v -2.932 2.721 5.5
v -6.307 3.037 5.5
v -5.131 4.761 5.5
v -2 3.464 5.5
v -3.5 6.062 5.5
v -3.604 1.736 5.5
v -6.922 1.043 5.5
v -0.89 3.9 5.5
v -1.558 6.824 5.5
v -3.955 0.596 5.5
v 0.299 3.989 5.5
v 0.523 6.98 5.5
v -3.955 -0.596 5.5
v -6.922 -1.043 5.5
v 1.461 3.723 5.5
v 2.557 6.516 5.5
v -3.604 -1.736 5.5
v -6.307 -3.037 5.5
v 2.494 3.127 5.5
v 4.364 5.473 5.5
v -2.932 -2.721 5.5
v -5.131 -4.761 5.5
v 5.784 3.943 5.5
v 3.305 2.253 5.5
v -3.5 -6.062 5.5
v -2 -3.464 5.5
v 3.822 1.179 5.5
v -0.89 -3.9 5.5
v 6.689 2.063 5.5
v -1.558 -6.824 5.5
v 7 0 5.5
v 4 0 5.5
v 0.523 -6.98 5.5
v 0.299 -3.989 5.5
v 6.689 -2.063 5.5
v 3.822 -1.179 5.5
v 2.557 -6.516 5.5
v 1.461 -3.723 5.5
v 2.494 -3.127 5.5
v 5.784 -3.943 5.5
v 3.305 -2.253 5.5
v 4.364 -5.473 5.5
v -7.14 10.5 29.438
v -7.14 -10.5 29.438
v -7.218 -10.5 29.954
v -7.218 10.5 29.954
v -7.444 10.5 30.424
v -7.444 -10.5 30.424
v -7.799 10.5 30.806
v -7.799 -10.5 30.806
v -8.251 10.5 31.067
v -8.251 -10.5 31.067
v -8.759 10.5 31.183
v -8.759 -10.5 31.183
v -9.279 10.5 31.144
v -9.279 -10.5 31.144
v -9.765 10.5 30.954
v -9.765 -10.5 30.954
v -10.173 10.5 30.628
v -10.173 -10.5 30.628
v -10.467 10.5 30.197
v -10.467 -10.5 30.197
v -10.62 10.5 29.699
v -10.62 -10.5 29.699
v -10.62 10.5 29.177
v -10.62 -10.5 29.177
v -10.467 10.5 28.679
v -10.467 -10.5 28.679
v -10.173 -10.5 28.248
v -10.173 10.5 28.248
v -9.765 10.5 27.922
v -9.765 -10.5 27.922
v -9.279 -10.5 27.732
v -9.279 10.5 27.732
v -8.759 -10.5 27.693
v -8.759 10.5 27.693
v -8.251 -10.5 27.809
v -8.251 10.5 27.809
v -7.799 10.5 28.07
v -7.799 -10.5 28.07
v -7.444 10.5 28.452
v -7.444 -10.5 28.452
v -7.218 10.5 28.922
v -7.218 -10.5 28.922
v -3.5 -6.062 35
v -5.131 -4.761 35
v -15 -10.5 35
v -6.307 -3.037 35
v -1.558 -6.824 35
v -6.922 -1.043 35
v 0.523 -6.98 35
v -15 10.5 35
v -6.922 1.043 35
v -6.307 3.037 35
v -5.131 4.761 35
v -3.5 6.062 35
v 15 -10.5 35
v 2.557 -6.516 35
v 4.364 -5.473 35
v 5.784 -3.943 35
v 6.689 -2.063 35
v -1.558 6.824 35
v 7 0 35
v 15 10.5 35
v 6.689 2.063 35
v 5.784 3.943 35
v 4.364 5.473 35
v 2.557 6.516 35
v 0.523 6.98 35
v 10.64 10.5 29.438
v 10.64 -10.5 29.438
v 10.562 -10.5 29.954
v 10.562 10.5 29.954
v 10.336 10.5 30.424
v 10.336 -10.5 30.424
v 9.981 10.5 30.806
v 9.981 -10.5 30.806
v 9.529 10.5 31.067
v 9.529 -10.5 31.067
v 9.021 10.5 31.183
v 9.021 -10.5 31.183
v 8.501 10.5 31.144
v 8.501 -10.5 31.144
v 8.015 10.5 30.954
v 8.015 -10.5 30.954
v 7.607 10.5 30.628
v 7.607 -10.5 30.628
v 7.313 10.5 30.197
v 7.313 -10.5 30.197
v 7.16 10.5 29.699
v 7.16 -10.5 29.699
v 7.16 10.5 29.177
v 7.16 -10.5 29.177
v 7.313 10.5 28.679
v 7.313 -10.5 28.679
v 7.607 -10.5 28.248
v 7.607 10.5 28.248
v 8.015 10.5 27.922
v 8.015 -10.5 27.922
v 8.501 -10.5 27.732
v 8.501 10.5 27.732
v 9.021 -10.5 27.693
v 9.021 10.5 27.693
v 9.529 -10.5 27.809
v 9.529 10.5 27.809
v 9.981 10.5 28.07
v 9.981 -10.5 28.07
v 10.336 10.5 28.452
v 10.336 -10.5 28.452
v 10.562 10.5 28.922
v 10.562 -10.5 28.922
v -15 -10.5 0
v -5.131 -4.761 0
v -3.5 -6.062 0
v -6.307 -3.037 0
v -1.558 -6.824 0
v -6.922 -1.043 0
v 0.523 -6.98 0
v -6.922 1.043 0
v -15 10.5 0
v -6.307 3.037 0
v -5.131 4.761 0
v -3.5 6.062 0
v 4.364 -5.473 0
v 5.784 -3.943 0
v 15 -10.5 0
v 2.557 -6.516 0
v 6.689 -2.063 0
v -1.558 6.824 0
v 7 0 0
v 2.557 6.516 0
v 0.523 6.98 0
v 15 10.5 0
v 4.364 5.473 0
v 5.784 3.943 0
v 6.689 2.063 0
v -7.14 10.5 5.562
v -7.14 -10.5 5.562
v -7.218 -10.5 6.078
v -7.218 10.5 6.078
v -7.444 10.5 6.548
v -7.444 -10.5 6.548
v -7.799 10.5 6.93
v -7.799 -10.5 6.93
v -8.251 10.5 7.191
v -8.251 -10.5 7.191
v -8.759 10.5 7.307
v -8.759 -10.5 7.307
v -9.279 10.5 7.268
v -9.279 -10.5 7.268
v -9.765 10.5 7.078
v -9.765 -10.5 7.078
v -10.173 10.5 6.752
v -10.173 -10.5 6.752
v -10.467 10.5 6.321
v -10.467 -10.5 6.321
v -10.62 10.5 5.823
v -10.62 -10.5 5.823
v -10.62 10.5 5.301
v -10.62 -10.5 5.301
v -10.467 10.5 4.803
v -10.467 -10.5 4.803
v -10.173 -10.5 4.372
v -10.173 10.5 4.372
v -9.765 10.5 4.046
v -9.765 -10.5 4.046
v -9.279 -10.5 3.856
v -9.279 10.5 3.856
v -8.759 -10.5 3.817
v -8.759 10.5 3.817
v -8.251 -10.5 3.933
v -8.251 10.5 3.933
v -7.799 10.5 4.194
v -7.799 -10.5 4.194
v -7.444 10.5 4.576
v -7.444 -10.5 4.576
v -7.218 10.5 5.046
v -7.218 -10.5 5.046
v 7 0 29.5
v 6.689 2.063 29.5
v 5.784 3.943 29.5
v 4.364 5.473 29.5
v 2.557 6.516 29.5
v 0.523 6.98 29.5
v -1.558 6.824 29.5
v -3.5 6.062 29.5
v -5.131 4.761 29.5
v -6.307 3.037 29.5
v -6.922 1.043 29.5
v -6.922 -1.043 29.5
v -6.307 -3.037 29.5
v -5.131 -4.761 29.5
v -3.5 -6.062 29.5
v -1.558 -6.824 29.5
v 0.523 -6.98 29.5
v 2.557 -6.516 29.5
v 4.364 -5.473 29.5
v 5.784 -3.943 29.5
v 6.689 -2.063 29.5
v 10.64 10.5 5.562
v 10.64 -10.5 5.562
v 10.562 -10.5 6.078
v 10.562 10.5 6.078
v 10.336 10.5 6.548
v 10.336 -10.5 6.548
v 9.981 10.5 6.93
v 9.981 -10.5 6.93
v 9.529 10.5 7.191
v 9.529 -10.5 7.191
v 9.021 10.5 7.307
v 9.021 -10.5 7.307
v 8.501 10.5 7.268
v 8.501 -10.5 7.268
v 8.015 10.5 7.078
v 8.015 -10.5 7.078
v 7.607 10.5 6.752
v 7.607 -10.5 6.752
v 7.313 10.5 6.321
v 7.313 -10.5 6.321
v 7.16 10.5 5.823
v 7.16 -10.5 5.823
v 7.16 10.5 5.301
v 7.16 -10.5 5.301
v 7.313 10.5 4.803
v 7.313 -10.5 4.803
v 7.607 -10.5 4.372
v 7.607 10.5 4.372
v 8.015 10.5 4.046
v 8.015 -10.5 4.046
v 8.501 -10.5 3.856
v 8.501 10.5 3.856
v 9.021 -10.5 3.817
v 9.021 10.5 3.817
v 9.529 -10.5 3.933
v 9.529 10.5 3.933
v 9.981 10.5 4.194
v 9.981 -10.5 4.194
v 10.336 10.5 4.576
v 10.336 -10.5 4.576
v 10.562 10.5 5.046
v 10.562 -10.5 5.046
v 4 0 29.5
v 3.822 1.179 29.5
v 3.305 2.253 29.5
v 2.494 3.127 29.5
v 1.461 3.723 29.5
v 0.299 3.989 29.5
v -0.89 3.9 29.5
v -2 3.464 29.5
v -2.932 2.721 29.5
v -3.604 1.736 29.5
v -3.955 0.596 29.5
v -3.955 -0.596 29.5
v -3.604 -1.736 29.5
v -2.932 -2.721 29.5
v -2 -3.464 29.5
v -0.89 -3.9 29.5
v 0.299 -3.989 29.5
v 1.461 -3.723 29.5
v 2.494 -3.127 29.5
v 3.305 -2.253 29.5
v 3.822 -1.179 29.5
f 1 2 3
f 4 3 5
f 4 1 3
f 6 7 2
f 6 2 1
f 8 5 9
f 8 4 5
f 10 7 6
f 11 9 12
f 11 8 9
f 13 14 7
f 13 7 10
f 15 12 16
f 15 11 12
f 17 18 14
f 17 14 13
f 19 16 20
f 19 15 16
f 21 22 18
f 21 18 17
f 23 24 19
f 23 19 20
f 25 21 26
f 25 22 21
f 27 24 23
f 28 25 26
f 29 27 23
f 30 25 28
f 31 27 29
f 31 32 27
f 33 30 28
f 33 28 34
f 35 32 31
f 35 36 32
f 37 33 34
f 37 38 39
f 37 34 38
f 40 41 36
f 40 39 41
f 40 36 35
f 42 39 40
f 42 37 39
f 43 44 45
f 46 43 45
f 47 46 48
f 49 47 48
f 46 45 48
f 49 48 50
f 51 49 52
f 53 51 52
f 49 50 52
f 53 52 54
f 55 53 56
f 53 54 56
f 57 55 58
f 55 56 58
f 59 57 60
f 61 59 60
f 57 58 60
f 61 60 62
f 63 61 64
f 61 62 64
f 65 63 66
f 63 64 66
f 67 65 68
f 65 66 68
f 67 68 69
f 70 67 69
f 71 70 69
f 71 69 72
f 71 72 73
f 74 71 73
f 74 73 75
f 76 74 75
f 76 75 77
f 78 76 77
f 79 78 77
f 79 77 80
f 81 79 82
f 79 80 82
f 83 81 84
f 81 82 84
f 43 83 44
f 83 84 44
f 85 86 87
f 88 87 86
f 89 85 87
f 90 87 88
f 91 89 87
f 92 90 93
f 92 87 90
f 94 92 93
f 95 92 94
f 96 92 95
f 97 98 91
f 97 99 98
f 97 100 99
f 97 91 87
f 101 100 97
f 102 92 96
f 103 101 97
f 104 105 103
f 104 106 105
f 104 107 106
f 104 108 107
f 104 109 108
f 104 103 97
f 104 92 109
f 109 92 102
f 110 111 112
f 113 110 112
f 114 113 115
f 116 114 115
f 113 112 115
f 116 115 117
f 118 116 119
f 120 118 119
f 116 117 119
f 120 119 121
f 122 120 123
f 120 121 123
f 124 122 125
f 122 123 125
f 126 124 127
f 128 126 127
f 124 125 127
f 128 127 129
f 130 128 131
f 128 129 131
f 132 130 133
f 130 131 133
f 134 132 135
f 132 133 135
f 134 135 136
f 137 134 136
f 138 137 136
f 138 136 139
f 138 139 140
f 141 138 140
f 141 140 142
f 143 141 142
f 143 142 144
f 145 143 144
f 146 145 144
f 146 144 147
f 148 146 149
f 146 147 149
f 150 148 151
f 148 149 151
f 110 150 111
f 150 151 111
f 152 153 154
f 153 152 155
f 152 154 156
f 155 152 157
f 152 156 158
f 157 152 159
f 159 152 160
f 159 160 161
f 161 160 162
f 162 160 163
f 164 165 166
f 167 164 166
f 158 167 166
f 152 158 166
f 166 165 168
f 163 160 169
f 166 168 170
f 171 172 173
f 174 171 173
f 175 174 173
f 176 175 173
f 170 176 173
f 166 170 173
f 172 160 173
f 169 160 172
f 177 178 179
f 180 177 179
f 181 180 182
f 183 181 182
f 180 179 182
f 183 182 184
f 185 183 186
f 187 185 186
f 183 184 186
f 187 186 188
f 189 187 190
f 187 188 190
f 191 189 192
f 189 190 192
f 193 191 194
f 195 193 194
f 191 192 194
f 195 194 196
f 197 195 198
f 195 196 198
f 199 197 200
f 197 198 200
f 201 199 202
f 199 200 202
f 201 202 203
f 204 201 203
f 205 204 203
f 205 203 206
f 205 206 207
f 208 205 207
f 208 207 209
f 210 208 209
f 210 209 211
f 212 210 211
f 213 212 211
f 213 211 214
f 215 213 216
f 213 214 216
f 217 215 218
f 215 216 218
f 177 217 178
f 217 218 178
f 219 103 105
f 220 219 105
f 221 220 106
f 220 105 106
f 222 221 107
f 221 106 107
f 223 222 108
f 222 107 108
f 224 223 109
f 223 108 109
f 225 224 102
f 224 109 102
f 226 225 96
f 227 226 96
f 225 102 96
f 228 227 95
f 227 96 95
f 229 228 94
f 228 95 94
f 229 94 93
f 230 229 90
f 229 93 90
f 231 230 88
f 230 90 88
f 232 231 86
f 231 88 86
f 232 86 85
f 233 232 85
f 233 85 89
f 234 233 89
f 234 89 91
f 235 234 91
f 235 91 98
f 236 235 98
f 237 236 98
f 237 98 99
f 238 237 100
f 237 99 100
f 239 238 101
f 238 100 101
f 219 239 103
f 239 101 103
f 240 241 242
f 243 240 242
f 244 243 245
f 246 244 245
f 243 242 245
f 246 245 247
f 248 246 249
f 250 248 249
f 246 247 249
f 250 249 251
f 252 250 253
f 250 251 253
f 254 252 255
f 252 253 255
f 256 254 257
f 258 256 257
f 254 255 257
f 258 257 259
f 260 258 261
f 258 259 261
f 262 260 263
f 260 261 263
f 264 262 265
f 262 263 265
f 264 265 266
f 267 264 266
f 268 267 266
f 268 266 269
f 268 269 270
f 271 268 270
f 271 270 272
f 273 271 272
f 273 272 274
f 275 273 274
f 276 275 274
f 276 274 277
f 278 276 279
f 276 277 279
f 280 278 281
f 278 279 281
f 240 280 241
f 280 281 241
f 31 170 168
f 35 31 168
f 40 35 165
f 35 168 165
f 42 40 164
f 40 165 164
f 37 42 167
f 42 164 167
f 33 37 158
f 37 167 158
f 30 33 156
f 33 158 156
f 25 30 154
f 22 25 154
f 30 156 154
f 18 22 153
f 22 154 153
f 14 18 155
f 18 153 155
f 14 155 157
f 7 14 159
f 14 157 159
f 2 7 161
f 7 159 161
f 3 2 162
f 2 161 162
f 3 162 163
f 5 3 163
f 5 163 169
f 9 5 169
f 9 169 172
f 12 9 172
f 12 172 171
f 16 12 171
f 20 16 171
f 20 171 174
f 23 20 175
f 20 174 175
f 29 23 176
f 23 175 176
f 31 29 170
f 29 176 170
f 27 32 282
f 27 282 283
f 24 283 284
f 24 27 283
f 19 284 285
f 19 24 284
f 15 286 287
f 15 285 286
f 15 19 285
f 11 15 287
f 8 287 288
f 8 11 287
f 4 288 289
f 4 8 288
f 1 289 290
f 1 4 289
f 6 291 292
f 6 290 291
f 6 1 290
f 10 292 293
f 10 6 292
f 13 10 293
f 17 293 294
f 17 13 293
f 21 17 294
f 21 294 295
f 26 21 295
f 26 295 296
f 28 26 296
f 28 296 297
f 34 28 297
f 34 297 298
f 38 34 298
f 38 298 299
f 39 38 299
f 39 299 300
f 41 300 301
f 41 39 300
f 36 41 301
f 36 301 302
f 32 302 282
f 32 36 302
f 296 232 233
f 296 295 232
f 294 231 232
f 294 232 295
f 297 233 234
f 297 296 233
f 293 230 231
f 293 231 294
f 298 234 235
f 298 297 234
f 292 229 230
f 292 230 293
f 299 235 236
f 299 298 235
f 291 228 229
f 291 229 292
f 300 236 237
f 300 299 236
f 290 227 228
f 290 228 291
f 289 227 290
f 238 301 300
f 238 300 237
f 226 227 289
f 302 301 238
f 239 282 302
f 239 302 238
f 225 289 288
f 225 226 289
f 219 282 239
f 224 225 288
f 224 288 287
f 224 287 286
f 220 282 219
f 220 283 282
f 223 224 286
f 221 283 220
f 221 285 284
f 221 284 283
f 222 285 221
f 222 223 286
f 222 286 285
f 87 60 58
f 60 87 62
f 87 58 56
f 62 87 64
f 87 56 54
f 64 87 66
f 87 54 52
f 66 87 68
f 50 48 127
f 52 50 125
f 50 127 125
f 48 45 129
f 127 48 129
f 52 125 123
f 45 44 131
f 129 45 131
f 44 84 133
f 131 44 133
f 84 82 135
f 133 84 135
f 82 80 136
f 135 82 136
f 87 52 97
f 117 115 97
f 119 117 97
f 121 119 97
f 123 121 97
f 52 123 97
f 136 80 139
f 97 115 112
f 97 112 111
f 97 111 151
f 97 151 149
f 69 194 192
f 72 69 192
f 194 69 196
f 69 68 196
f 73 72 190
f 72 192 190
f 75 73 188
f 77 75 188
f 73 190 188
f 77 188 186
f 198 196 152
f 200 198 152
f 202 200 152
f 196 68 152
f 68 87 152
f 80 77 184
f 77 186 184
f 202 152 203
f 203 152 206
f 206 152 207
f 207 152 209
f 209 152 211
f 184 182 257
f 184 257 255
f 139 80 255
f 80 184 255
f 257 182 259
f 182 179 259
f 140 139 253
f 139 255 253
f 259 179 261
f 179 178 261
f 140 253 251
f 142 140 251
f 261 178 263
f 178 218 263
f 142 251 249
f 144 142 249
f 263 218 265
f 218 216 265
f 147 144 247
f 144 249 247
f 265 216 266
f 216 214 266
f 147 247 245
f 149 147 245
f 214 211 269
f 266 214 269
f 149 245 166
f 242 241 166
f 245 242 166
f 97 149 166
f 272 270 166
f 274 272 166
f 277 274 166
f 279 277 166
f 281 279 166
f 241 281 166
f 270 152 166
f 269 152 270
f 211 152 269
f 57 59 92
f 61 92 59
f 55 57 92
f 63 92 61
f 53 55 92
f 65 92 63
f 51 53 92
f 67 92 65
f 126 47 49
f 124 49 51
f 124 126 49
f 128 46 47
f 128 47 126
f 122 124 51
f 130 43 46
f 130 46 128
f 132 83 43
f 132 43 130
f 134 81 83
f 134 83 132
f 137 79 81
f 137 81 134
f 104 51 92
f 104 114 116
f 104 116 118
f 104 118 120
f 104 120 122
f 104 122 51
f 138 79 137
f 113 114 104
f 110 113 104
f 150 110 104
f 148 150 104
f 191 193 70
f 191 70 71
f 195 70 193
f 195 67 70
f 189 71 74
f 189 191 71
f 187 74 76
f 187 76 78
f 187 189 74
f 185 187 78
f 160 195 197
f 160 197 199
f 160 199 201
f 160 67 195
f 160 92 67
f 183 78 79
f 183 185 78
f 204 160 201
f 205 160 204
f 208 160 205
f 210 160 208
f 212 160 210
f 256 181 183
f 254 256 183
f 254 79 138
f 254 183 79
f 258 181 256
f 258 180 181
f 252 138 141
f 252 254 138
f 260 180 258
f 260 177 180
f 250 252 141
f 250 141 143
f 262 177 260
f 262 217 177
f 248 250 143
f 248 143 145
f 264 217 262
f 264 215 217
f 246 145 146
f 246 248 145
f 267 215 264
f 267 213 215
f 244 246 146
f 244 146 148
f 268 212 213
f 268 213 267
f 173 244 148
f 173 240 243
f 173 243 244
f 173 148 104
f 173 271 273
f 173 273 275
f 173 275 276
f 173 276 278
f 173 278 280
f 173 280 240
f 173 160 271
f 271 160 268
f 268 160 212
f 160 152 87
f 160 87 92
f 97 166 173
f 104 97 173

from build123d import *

# Parameters (mm, degrees)
F0_W     = 30
F0_H     = 21
F0_R     = 4
F1_DEPTH = 35
F2_R     = 7
F3_DEPTH = 5.5
F4_R     = 7
F5_DEPTH = 5.5
F6_R     = 1.75
F7_DEPTH = 21


with BuildPart() as f1:
    # F0 (on Top) → F1 (new body)
    with BuildSketch(Plane.XY):
        Rectangle(F0_W, F0_H)
        Circle(F0_R, mode=Mode.SUBTRACT)
    extrude(amount=F1_DEPTH)

    # F2 (on face) → F3 (cut)
    with BuildSketch(Plane.XY.offset(35)):
        Circle(F2_R)
    extrude(amount=-F3_DEPTH, mode=Mode.SUBTRACT)

    # F4 (on face) → F5 (cut)
    with BuildSketch(Plane(origin=(0, 0, 0), x_dir=(1, 0, 0), z_dir=(0, 0, -1))):
        Circle(F4_R)
    extrude(amount=-F5_DEPTH, mode=Mode.SUBTRACT)

    # F6 (on face) → F7 (cut, through all)
    with BuildSketch(Plane.XZ.offset(10.5)):
        with Locations((8.89, 5.562)):
            Circle(F6_R)
        with Locations((-8.89, 5.562)):
            Circle(F6_R)
        with Locations((8.89, 29.438)):
            Circle(F6_R)
        with Locations((-8.89, 29.438)):
            Circle(F6_R)
    extrude(amount=-F7_DEPTH, mode=Mode.SUBTRACT)


solid = f1.part
